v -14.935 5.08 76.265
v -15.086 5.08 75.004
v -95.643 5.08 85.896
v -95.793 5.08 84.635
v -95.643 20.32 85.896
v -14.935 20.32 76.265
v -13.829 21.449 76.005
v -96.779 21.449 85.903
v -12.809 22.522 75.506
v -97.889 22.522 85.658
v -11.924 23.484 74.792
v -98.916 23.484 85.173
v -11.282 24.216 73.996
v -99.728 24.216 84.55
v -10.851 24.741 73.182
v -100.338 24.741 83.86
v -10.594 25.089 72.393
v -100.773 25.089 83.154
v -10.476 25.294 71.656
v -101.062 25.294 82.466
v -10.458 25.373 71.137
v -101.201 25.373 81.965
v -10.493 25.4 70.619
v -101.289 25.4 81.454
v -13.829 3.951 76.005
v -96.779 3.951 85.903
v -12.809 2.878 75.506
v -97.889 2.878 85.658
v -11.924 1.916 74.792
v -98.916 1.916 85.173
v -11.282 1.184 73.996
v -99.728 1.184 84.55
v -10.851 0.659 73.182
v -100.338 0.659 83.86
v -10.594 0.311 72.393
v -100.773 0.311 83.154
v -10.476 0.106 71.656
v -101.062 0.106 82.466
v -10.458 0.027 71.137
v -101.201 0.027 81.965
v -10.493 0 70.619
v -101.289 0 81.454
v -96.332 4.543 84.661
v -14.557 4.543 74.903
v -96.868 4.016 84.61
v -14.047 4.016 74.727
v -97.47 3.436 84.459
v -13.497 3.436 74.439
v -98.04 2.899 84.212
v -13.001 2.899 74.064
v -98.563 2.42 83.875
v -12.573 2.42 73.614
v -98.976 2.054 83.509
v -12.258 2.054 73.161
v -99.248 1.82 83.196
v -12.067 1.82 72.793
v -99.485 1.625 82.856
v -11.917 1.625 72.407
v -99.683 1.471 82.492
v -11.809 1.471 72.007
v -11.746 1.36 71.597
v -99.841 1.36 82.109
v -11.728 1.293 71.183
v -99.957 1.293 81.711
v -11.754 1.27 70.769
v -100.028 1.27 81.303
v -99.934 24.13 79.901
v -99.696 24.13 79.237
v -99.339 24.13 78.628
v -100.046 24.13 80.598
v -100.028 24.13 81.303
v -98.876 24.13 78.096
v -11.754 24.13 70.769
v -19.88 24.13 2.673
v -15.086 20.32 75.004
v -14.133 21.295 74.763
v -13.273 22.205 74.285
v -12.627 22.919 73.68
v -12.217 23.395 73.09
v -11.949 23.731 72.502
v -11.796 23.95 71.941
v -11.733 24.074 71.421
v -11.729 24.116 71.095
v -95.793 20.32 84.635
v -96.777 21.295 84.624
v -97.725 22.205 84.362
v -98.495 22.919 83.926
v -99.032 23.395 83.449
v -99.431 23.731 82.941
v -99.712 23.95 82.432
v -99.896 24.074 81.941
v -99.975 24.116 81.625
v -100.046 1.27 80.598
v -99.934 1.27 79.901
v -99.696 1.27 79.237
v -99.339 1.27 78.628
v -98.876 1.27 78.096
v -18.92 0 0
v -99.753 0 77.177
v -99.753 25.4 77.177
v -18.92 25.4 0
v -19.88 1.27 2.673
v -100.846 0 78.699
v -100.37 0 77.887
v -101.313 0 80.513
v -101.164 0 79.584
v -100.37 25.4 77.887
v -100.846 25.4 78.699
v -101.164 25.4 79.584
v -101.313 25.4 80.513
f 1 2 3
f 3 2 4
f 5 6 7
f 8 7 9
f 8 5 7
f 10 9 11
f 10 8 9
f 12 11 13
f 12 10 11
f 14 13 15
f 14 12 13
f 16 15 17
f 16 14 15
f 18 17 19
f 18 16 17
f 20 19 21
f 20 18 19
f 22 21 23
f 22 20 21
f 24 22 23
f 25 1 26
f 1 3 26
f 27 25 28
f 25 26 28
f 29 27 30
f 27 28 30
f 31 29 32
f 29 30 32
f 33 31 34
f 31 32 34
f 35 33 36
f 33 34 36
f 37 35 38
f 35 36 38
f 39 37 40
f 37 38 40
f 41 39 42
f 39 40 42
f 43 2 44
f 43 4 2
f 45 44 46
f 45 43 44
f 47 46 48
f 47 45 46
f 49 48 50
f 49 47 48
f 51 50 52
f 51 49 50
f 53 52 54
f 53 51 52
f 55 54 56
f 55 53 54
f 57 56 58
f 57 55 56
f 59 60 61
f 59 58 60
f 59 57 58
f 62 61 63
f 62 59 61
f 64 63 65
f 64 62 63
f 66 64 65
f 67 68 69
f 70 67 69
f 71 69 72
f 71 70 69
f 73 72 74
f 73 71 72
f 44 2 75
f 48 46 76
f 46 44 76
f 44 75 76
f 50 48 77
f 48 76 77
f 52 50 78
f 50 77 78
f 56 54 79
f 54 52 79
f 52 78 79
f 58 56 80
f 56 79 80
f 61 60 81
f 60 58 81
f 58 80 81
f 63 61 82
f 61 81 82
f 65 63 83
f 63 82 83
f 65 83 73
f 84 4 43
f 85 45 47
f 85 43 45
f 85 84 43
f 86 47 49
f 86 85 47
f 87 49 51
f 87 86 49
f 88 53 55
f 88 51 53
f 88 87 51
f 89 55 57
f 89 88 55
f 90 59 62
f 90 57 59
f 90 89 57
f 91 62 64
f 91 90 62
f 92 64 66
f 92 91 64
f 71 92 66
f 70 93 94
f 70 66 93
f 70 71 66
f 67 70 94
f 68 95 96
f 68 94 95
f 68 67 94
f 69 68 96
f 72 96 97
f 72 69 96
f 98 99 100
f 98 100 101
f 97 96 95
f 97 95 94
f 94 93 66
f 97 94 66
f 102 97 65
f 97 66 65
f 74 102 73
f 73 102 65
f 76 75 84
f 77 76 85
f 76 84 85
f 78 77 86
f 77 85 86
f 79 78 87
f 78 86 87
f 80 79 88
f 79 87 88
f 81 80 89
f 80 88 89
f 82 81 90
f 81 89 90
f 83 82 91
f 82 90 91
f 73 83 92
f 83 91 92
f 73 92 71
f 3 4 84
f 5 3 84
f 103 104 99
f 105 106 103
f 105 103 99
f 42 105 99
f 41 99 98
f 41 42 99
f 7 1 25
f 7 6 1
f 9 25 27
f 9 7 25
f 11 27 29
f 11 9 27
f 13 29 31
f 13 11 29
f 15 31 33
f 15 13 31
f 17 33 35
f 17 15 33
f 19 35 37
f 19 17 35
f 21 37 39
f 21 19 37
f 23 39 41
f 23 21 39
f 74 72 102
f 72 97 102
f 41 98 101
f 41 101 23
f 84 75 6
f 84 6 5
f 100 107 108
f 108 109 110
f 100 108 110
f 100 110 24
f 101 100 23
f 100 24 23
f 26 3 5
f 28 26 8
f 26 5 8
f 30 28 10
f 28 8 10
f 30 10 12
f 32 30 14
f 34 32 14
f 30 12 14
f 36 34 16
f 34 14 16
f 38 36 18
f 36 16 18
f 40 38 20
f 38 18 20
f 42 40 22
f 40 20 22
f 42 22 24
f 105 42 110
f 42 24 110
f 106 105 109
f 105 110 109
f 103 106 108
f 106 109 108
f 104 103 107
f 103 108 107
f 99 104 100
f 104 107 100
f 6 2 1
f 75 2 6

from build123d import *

# Parameters (mm, degrees)
F1_DEPTH = 25.4
F2_R     = 5.08
F3_T     = -1.27


# Not quite as in the source:
# - a shell that OpenCascade refuses in one call is made with other operations: the cavity is built on its own and cut out


with BuildPart() as f1:
    # F0 (on Front) → F1 (new body)
    with BuildSketch(Plane.XZ):
        Polygon((-9.891229794, 75.6632118021), (-110.7755121968, 87.7015490657), (-18.9199827418, 0), align=None)
    extrude(amount=-F1_DEPTH)

    # F2
    f2_edges = [f1.edges().sort_by_distance(p)[0] for p in [
        (-60.333371, 0, 81.68238),
        (-110.775512, 12.7, 87.701549),
        (-60.333371, 25.4, 81.68238),
        (-9.89123, 12.7, 75.663212),
    ]]
    fillet(f2_edges, radius=F2_R)

    # F3: a shell. OpenCascade refuses it in one call, so the cavity is built on its own and cut out:
    # the body offset inwards by the wall thickness, plus a prism from it out through each open face.
    f3_core = offset(f1.part, amount=F3_T, mode=Mode.PRIVATE)
    f3_exits = [f3_core.faces().sort_by_distance(p)[0] for p in [
        (-55.439636, 12.7, 79.81941),
    ]]
    add(f3_core, mode=Mode.SUBTRACT)
    extrude(f3_exits, amount=-F3_T, mode=Mode.SUBTRACT)


solid = f1.part
